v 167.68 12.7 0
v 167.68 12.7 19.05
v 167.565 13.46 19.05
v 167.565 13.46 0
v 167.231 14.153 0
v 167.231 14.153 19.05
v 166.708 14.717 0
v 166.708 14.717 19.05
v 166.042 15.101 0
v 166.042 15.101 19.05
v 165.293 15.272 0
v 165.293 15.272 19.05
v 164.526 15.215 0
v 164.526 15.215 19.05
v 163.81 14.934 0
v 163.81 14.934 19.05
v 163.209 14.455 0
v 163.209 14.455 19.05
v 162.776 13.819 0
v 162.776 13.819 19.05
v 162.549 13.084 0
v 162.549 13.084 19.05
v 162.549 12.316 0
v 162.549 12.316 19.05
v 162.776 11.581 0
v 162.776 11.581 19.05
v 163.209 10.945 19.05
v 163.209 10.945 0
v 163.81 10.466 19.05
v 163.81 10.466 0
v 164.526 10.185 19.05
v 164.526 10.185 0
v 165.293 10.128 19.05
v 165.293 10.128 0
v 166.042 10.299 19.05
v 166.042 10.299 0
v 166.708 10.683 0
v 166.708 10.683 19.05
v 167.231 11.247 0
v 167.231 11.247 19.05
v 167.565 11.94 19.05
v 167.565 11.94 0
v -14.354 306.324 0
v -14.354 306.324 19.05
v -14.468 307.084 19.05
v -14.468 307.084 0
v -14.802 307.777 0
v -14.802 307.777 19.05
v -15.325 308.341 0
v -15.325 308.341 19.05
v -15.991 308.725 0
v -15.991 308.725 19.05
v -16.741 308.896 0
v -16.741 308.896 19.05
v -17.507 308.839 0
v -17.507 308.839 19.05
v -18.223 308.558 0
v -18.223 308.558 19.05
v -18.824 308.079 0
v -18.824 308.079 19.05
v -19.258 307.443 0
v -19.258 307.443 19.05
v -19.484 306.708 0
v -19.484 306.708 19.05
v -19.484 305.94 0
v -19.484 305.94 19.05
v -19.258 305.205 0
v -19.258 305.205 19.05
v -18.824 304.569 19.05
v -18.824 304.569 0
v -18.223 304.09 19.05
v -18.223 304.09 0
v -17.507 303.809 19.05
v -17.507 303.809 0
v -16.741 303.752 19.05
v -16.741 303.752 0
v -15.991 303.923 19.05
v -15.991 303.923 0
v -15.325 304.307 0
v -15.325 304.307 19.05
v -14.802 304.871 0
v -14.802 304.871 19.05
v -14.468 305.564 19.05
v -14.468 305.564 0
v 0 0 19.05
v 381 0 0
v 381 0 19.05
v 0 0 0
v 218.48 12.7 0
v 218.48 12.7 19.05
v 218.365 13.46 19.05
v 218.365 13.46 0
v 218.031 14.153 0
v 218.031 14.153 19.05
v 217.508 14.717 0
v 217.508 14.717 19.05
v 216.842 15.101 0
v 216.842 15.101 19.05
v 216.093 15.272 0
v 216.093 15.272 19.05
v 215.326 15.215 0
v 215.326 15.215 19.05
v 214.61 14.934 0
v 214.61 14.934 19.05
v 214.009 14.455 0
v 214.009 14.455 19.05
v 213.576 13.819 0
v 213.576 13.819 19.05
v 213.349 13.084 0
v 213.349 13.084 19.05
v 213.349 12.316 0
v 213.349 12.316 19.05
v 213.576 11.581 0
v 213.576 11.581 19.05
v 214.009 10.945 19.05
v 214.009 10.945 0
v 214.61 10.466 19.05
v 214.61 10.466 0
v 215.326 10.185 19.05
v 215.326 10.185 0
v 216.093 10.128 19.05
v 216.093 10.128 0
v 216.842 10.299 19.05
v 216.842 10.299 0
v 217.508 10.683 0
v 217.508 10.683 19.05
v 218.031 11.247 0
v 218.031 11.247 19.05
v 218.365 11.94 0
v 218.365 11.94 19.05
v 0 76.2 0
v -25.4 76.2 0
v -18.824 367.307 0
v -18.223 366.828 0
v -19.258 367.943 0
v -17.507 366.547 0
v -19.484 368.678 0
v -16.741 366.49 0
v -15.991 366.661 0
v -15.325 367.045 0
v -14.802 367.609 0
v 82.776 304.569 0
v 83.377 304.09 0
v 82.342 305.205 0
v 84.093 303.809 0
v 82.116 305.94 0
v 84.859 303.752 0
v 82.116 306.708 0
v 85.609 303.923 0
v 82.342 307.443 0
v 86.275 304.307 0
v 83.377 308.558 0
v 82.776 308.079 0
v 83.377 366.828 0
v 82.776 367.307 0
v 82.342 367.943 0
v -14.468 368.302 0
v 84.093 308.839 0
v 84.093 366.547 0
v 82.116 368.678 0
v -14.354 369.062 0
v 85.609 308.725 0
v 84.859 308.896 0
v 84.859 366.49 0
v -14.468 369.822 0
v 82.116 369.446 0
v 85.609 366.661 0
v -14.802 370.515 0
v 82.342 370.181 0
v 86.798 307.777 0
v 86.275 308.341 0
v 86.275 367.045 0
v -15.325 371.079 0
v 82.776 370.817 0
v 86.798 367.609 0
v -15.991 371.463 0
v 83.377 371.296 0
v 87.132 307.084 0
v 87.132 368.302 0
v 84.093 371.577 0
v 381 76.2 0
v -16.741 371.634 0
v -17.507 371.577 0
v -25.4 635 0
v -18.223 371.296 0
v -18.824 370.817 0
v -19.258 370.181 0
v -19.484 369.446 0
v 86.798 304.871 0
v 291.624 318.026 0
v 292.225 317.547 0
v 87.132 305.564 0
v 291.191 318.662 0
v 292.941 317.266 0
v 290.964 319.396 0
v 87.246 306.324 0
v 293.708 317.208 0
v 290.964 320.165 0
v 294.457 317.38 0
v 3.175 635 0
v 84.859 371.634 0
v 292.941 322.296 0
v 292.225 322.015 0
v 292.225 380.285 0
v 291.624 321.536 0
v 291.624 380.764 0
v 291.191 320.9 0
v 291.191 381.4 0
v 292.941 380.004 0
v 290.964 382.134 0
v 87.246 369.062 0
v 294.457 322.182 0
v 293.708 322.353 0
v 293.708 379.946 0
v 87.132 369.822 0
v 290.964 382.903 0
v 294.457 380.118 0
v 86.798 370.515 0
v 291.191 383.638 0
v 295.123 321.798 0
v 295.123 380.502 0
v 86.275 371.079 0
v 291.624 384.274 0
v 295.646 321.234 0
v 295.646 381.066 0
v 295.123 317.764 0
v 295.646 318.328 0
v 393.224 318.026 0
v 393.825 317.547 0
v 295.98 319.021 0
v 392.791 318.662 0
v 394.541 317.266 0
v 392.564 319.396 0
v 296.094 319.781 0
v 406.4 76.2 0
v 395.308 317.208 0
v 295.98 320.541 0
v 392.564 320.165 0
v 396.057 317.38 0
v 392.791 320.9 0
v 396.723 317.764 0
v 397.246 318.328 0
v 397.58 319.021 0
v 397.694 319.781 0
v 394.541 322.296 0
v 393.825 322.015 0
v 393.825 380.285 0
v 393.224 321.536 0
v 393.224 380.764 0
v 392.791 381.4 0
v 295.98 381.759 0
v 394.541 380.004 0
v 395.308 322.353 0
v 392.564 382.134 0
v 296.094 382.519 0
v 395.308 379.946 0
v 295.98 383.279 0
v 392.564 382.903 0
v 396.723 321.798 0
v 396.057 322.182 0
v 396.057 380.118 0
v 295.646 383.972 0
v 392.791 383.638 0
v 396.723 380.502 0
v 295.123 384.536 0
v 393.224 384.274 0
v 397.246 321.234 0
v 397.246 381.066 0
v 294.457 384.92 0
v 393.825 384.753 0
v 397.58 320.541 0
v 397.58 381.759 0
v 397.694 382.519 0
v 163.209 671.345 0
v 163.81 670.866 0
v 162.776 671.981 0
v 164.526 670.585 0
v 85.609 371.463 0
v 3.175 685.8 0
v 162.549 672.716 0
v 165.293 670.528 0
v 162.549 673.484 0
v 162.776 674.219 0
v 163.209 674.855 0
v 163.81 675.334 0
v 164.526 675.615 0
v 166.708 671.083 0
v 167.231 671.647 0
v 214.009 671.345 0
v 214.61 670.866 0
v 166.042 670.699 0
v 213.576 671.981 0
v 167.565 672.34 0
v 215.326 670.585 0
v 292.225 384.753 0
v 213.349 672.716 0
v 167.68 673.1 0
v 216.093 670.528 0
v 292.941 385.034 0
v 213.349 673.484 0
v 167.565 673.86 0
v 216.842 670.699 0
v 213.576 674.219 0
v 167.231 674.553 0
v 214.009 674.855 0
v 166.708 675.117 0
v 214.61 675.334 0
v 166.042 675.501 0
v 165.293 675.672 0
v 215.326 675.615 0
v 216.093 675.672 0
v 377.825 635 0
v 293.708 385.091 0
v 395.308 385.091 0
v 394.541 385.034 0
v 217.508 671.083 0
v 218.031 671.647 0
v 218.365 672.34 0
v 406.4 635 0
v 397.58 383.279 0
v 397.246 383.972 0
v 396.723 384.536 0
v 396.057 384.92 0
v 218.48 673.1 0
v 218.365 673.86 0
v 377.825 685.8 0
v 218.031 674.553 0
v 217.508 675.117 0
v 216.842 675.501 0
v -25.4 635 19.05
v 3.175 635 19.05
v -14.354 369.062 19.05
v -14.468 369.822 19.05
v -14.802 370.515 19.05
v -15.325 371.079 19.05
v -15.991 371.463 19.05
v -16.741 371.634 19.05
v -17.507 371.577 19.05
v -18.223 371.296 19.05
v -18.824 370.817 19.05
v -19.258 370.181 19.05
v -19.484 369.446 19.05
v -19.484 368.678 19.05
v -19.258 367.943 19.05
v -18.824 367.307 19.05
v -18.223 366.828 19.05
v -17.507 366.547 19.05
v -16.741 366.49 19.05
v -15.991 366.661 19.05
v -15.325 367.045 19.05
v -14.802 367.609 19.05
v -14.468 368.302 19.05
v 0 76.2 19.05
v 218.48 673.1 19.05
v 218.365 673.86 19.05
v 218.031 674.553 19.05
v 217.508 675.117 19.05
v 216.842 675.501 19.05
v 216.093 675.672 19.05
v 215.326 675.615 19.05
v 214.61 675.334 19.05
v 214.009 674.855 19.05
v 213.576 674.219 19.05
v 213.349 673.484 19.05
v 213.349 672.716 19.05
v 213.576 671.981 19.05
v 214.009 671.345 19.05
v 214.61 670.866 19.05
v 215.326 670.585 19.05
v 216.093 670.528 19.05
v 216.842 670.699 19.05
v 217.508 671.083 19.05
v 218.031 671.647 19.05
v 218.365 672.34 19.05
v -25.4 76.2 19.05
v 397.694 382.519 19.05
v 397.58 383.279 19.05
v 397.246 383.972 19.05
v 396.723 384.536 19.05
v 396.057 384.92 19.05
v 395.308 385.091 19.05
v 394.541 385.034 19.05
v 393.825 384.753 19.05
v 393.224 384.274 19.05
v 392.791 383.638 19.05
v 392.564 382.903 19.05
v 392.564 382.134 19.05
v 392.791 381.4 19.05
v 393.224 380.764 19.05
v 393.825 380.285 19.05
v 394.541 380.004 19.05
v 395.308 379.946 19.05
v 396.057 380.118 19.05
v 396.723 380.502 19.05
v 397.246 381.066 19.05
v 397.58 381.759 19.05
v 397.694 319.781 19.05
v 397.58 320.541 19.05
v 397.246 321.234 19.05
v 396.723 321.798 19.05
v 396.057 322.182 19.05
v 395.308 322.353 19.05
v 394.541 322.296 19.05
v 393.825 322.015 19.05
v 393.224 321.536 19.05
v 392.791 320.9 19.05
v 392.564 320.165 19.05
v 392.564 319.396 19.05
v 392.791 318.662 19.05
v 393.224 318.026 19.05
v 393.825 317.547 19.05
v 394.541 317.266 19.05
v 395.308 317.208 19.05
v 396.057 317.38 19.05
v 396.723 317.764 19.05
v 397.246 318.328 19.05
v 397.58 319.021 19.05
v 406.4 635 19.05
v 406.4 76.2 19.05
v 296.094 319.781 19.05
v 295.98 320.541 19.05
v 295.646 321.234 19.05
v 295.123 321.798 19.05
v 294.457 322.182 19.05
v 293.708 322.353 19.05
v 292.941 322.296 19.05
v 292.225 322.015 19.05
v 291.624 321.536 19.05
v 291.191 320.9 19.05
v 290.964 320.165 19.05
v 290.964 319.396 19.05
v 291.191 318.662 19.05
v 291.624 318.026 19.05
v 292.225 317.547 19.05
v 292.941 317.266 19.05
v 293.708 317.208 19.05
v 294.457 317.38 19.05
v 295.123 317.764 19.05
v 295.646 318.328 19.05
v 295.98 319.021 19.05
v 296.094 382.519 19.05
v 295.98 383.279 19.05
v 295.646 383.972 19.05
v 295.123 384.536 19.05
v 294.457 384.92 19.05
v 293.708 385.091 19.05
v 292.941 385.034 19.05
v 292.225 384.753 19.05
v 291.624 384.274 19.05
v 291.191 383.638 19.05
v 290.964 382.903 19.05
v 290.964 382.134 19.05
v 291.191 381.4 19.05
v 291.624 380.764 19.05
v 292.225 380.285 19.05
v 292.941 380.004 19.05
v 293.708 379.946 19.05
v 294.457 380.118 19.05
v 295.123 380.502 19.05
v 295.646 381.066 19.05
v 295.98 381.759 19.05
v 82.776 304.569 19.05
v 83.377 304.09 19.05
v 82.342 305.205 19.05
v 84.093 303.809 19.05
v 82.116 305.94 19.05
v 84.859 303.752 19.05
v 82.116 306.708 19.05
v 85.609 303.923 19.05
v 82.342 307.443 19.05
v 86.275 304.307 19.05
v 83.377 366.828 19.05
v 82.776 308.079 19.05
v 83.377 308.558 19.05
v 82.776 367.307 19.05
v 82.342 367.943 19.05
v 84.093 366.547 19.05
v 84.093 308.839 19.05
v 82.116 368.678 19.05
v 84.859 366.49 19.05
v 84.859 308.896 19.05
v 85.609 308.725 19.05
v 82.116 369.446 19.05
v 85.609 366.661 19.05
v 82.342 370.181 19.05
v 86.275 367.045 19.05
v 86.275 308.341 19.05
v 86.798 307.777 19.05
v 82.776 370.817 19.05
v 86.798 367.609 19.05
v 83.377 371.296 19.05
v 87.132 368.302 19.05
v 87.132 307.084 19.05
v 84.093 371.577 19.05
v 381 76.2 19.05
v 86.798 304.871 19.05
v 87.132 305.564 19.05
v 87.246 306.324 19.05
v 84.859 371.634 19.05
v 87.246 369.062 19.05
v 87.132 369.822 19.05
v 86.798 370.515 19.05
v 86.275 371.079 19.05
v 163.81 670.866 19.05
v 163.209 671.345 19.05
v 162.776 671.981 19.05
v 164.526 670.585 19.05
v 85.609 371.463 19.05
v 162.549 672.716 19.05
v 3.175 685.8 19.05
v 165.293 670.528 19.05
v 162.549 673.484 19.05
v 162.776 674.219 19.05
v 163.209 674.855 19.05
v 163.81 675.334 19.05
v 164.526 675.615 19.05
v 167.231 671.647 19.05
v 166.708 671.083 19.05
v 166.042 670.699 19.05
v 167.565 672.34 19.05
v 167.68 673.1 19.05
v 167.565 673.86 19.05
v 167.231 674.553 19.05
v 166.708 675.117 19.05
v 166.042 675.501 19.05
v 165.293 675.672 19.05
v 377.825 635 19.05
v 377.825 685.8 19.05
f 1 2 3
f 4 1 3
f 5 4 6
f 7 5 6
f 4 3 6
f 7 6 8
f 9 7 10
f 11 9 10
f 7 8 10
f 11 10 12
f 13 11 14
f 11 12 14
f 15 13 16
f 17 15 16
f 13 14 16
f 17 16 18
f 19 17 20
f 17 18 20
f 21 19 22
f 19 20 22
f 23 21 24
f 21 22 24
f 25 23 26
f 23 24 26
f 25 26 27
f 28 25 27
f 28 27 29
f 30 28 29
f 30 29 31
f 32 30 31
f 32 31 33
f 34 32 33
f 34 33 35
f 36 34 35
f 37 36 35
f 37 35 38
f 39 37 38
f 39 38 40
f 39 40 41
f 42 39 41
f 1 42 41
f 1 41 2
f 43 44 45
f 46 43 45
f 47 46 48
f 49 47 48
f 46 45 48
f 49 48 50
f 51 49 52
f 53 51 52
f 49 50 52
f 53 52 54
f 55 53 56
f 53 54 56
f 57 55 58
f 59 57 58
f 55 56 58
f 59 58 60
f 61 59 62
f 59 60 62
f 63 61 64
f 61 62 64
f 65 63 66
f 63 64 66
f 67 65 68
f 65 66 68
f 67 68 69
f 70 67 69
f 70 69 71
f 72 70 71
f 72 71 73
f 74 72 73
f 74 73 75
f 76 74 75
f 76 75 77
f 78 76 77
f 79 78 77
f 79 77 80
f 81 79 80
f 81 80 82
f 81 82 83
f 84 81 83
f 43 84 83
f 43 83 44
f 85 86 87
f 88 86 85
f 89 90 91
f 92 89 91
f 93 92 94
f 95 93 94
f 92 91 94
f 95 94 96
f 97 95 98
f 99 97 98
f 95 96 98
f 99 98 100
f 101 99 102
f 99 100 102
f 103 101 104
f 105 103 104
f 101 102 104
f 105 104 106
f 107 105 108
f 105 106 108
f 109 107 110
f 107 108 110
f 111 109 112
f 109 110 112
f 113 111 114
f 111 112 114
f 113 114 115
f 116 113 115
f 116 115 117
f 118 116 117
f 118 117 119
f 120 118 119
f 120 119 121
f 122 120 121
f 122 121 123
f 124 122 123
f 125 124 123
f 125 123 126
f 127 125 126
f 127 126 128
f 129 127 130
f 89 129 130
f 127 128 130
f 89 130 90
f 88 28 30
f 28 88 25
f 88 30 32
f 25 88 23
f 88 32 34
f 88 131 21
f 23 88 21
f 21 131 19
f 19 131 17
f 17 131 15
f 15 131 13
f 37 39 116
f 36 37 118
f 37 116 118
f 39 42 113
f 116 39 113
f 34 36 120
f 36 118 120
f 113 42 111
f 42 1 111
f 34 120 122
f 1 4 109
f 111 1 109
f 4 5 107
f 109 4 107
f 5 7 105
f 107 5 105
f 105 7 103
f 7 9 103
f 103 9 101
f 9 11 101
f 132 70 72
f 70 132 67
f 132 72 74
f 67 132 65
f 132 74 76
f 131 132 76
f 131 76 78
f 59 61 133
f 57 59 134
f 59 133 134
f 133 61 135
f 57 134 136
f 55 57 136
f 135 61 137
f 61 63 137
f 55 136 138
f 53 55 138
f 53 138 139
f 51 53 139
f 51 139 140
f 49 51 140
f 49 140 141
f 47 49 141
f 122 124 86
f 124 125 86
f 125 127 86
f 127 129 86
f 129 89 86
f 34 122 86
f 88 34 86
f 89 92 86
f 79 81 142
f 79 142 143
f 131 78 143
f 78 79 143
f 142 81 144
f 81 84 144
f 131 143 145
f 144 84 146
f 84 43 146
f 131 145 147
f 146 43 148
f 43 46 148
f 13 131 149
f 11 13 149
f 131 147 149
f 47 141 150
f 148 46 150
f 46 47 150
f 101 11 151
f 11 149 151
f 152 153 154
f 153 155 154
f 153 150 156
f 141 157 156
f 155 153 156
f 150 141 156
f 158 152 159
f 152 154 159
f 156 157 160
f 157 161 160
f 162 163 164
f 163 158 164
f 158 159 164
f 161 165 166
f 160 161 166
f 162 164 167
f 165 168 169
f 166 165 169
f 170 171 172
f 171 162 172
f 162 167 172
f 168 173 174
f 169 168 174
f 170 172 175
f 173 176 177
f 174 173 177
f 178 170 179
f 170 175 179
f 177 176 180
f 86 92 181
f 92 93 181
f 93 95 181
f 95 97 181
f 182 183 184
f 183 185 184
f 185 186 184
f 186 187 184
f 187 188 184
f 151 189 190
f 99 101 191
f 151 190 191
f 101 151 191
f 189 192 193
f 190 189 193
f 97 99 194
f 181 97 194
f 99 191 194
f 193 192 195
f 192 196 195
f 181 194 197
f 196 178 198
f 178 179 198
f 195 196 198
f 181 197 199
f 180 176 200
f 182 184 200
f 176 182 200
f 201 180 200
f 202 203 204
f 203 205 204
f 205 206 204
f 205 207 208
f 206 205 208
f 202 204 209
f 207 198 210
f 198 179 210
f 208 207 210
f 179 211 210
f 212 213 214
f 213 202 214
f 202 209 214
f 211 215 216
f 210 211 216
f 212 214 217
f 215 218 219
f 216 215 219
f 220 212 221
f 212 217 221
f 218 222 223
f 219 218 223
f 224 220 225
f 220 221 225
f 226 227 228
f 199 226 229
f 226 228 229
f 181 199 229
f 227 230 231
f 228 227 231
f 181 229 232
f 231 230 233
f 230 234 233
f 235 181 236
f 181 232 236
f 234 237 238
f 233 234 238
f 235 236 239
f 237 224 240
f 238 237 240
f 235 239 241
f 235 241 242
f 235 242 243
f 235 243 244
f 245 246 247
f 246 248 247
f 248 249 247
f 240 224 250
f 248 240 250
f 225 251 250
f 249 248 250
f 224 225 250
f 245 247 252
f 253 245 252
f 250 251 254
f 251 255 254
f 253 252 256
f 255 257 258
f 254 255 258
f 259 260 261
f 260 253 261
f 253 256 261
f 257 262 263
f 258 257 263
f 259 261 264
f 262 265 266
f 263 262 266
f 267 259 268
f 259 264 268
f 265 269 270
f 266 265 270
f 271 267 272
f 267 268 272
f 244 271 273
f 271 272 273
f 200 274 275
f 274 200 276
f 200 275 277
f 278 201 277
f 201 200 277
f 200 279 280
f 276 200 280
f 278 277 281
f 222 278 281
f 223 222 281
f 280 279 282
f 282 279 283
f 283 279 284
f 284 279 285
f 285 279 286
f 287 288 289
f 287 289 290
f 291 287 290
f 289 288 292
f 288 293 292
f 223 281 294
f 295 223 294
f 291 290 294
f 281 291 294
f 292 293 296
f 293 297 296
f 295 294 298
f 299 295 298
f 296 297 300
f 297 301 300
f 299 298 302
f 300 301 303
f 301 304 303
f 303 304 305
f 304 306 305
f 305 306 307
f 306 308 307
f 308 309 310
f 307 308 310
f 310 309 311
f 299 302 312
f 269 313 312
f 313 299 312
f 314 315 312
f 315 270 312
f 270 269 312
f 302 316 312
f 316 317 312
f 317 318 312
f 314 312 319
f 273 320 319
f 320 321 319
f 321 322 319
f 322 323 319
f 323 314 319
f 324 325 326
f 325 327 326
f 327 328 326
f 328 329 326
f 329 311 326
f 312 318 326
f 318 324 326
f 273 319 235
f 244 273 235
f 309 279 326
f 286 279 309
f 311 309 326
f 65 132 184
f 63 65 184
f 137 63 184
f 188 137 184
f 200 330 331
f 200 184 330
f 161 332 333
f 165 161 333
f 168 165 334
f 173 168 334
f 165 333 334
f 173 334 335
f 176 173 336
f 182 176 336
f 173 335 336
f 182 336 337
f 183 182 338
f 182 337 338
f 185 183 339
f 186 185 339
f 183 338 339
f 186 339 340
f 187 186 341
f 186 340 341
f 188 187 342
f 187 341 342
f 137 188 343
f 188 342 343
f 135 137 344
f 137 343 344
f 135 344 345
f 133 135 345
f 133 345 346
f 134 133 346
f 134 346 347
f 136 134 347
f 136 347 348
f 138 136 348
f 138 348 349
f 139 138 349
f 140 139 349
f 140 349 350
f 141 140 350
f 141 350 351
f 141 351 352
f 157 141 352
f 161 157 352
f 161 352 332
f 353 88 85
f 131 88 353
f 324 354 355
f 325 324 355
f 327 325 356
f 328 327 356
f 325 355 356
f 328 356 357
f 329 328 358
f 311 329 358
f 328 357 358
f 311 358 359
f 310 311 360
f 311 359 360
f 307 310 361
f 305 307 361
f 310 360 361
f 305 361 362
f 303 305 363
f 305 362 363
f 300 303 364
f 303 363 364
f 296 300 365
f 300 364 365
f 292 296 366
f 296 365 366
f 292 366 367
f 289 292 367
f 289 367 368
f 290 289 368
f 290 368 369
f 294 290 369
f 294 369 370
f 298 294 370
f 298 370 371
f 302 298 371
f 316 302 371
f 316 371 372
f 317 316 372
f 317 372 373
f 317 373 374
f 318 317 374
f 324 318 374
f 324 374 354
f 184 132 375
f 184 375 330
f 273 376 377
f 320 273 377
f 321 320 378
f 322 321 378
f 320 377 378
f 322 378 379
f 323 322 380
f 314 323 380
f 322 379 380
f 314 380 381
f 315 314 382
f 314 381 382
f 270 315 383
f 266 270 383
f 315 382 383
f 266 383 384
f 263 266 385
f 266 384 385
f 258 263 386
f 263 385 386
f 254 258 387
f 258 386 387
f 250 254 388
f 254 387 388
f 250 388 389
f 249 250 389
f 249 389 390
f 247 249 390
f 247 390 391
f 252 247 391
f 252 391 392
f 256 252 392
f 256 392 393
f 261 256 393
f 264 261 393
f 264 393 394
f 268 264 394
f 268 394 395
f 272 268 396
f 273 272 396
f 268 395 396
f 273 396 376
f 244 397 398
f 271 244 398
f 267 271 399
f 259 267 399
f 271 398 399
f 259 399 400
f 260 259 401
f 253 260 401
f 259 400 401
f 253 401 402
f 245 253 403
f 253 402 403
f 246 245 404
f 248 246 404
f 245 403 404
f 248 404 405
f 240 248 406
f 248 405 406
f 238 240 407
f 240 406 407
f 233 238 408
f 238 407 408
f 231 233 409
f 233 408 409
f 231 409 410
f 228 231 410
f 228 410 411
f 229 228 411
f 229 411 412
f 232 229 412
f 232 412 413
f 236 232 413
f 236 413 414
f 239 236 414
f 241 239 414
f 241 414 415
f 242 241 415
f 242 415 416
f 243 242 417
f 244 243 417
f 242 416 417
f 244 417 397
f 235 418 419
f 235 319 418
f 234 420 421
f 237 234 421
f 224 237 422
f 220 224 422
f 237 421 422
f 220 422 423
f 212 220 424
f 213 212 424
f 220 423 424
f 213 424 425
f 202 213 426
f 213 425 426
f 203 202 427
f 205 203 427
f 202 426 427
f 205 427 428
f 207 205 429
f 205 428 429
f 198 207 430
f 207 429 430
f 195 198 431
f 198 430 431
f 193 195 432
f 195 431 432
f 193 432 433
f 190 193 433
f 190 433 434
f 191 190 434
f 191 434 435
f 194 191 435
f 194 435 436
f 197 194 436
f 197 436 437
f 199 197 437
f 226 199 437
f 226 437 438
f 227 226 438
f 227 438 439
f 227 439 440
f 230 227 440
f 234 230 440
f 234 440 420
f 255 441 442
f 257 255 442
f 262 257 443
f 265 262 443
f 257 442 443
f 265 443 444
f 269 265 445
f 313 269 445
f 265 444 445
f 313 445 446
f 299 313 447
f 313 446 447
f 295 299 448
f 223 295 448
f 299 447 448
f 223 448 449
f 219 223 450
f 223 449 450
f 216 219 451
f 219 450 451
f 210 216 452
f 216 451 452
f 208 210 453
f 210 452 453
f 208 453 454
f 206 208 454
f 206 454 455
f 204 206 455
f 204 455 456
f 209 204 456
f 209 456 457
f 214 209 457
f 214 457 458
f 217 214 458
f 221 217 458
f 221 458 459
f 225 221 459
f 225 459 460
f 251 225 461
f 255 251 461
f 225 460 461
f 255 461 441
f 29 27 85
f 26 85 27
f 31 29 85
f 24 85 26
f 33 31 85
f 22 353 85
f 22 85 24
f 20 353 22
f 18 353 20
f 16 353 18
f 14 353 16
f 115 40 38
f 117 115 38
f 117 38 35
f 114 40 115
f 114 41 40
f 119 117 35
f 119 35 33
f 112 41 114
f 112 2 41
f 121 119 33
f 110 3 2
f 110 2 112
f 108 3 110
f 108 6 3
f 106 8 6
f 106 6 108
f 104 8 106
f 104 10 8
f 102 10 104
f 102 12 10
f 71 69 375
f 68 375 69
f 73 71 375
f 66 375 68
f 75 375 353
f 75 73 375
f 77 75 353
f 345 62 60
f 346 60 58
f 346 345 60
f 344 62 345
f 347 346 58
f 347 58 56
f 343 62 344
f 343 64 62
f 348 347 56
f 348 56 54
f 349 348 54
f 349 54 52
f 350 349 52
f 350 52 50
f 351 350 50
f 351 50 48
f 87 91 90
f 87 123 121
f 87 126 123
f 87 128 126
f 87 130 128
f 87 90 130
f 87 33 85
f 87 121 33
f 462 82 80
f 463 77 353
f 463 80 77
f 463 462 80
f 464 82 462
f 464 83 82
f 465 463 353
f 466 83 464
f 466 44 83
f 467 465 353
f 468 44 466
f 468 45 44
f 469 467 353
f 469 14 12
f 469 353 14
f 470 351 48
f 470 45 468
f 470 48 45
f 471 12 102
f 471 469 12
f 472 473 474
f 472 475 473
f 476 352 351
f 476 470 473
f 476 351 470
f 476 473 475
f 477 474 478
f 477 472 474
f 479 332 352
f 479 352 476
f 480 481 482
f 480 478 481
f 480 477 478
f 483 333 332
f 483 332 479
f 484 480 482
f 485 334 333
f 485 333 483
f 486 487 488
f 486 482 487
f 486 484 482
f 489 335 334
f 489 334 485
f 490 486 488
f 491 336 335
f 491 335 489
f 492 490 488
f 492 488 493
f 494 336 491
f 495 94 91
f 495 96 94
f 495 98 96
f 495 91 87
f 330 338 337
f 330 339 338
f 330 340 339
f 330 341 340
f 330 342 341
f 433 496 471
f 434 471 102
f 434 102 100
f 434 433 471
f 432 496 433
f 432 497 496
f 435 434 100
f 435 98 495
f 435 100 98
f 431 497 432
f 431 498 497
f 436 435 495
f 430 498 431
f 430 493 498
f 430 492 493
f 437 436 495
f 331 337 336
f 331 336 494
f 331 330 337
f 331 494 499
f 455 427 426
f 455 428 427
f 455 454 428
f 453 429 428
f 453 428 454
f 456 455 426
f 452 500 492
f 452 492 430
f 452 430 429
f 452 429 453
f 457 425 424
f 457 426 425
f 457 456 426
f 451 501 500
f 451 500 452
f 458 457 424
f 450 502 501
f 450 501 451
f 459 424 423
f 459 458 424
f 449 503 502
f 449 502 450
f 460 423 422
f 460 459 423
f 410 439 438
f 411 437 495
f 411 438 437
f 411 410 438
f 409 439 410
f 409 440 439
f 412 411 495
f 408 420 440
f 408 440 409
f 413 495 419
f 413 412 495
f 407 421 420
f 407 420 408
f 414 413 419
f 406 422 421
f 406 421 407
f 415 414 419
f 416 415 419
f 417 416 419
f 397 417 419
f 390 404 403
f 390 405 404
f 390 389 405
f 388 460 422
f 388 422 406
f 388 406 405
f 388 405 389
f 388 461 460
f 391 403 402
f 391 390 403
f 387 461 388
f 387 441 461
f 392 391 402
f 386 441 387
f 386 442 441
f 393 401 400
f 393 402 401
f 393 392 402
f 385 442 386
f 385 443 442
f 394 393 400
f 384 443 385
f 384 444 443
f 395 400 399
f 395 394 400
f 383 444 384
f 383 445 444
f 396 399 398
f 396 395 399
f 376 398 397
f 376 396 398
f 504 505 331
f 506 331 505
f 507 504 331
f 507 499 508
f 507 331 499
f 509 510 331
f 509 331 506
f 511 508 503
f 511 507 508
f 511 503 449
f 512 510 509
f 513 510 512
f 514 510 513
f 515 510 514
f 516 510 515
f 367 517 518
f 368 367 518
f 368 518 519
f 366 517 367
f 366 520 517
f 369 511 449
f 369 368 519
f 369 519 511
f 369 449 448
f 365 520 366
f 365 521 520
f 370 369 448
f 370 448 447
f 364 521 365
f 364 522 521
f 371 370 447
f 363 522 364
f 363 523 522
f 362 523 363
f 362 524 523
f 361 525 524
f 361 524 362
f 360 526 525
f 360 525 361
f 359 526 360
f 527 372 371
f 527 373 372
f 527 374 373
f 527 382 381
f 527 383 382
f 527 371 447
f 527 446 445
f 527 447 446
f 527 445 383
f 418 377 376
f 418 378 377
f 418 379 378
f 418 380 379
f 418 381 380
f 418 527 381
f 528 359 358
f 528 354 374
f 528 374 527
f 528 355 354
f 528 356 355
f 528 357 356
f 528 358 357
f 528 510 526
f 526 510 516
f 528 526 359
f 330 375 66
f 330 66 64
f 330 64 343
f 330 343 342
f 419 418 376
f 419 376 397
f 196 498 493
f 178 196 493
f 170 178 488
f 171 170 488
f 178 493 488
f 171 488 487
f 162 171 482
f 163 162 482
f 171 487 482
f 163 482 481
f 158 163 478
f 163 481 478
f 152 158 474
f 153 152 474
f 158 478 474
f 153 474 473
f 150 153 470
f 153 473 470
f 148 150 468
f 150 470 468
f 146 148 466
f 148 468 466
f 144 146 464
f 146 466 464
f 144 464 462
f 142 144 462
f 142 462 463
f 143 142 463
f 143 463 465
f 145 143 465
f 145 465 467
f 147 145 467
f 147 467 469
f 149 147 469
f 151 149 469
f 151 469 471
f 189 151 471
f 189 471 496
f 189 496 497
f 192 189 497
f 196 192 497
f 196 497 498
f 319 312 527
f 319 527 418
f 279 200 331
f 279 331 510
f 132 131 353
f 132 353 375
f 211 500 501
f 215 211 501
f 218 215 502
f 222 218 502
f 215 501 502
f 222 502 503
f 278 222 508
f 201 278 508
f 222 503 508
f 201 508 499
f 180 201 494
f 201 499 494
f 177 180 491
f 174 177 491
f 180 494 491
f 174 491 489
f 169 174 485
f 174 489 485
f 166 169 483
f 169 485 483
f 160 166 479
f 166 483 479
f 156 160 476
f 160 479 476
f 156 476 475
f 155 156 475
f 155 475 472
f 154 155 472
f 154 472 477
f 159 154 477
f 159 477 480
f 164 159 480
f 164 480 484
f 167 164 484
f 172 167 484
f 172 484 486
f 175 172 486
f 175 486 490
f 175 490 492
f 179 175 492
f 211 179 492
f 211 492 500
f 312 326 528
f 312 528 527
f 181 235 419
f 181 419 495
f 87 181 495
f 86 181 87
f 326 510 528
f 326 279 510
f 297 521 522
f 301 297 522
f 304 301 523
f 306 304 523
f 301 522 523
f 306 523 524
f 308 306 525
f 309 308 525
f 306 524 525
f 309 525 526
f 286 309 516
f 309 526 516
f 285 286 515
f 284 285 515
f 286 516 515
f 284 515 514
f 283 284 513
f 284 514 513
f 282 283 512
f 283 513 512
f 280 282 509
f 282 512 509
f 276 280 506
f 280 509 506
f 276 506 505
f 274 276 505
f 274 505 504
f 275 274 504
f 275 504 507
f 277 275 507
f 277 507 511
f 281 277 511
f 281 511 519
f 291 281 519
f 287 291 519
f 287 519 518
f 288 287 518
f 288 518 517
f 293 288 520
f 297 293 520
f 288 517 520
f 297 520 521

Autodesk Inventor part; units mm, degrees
ref_plane "YZ Plane" through (0, 0, 0) normal (1, 0, 0) x (0, 1, 0)
ref_plane "XZ Plane" through (0, 0, 0) normal (0, 1, 0) x (-1, 0, 0)
ref_plane "XY Plane" through (0, 0, 0) normal (0, 0, 1) x (1, 0, 0)
sketch "Sketch1" plane through (0, 0, 0) normal (0, 0, 1) x (1, 0, 0)
  line L0 (0, 0) -> (0, 76.2)
  line L1 (0, 76.2) -> (-25.4, 76.2)
  line L2 (-25.4, 76.2) -> (-25.4, 635)
  line L3 (-25.4, 635) -> (3.175, 635)
  line L4 (3.175, 635) -> (3.175, 685.8)
  line L5 (3.175, 685.8) -> (377.825, 685.8)
  line L6 (377.825, 685.8) -> (377.825, 635)
  line L7 (377.825, 635) -> (406.4, 635)
  line L8 (406.4, 635) -> (406.4, 76.2)
  line L9 (406.4, 76.2) -> (381, 76.2)
  line L10 (381, 76.2) -> (381, 0)
  line L11 (381, 0) -> (0, 0)
  dimension "d0" = 76.2
  dimension "d1" = 25.4
  dimension "d2" = 558.8
  dimension "d3" = 28.575
  dimension "d4" = 50.8
  dimension "d5" = 374.65
  dimension "d6" = 28.575
  dimension "d7" = 25.4
extrude "Extrusion1" add sketch "Sketch1" along normal blind 19.05
sketch "Sketch2" plane through (0, 0, 19.05) normal (0, 0, 1) x (1, 0, 0)
  point P0 (0, 0)
sketch "Sketch3" plane through (0, 0, 19.05) normal (0, 0, 1) x (1, 0, 0)
  line L0 (-25.4, 635) -> (-25.4, 76.2) construction
  line L1 (-25.4, 635) -> (-25.4, 369.062) construction
  line L2 (-25.4, 369.062) -> (-16.9333, 369.062) construction
  line L3 (-25.4, 369.062) -> (-16.9333, 369.062) construction
  line L4 (-16.9333, 369.062) -> (84.6667, 369.062) construction
  line L5 (-25.4, 76.2) -> (-25.4, 306.324) construction
  line L6 (-25.4, 306.324) -> (-16.9333, 306.324) construction
  line L7 (-16.9333, 306.324) -> (84.6667, 306.324) construction
  circle A0 centre (84.6667, 369.062) radius 2.5797
  circle A1 centre (-16.9333, 369.062) radius 2.5797
  circle A2 centre (84.6667, 306.324) radius 2.5797
  circle A3 centre (-16.9333, 306.324) radius 2.5797
  line L8 (377.825, 685.8) -> (3.175, 685.8) construction
  line L9 (190.5, 685.8) -> (190.5, 0) construction
  line L10 (0, 0) -> (381, 0) construction
  line L11 (190.5, 0) -> (165.1, 0) construction
  line L12 (165.1, 0) -> (165.1, 12.7) construction
  circle A4 centre (165.1, 12.7) radius 2.5797
  line L13 (190.5, 685.8) -> (165.1, 685.8) construction
  line L14 (165.1, 685.8) -> (165.1, 673.1) construction
  circle A5 centre (165.1, 673.1) radius 2.5797
  line L15 (406.4, 635) -> (406.4, 76.2) construction
  line L16 (406.4, 635) -> (406.4, 369.062) construction
  line L17 (406.4, 76.2) -> (406.4, 306.324) construction
  line L18 (3.175, 685.8) -> (377.825, 685.8) construction
  line L19 (381, 0) -> (0, 0) construction
  line L20 (190.5, 0) -> (215.9, 0) construction
  line L21 (215.9, 0) -> (215.9, 12.7) construction
  circle A6 centre (215.9, 12.7) radius 2.5797
  line L22 (190.5, 685.8) -> (215.9, 685.8) construction
  line L23 (215.9, 685.8) -> (215.9, 673.1) construction
  circle A7 centre (215.9, 673.1) radius 2.5797
  line L24 (406.4, 76.2) -> (406.4, 635) projected
  line L25 (406.4, 685.8) -> (406.4, 382.5189) construction
  line L26 (406.4, 382.5189) -> (395.1148, 382.5189) construction
  line L27 (395.1148, 382.5189) -> (293.5148, 382.5189) construction
  line L28 (293.5148, 382.5189) -> (293.5148, 319.7809) construction
  line L29 (293.5148, 319.7809) -> (395.1148, 319.7809) construction
  circle A8 centre (395.1148, 382.5189) radius 2.5797
  circle A9 centre (293.5148, 382.5189) radius 2.5797
  circle A10 centre (293.5148, 319.7809) radius 2.5797
  circle A11 centre (395.1148, 319.7809) radius 2.5797
  dimension "d10" = 265.938
  dimension "d11" = 8.4667
  dimension "d12" = 0
  dimension "d13" = 101.6
  dimension "d14" = 230.124
  dimension "d15" = 5.1594
  dimension "d16" = 25.4
  dimension "d17" = 12.7
  dimension "d19" = 5.1594
  dimension "d20" = 25.4
  dimension "d21" = 12.7
  dimension "d25" = 303.2811
  dimension "d26" = 11.2852
  dimension "d27" = 101.6
  dimension "d28" = 62.738
  dimension "d29" = 5.1594
extrude "Extrusion2" cut sketch "Sketch3" against normal blind 25.4
properties part number "Arm Belly Pan"
